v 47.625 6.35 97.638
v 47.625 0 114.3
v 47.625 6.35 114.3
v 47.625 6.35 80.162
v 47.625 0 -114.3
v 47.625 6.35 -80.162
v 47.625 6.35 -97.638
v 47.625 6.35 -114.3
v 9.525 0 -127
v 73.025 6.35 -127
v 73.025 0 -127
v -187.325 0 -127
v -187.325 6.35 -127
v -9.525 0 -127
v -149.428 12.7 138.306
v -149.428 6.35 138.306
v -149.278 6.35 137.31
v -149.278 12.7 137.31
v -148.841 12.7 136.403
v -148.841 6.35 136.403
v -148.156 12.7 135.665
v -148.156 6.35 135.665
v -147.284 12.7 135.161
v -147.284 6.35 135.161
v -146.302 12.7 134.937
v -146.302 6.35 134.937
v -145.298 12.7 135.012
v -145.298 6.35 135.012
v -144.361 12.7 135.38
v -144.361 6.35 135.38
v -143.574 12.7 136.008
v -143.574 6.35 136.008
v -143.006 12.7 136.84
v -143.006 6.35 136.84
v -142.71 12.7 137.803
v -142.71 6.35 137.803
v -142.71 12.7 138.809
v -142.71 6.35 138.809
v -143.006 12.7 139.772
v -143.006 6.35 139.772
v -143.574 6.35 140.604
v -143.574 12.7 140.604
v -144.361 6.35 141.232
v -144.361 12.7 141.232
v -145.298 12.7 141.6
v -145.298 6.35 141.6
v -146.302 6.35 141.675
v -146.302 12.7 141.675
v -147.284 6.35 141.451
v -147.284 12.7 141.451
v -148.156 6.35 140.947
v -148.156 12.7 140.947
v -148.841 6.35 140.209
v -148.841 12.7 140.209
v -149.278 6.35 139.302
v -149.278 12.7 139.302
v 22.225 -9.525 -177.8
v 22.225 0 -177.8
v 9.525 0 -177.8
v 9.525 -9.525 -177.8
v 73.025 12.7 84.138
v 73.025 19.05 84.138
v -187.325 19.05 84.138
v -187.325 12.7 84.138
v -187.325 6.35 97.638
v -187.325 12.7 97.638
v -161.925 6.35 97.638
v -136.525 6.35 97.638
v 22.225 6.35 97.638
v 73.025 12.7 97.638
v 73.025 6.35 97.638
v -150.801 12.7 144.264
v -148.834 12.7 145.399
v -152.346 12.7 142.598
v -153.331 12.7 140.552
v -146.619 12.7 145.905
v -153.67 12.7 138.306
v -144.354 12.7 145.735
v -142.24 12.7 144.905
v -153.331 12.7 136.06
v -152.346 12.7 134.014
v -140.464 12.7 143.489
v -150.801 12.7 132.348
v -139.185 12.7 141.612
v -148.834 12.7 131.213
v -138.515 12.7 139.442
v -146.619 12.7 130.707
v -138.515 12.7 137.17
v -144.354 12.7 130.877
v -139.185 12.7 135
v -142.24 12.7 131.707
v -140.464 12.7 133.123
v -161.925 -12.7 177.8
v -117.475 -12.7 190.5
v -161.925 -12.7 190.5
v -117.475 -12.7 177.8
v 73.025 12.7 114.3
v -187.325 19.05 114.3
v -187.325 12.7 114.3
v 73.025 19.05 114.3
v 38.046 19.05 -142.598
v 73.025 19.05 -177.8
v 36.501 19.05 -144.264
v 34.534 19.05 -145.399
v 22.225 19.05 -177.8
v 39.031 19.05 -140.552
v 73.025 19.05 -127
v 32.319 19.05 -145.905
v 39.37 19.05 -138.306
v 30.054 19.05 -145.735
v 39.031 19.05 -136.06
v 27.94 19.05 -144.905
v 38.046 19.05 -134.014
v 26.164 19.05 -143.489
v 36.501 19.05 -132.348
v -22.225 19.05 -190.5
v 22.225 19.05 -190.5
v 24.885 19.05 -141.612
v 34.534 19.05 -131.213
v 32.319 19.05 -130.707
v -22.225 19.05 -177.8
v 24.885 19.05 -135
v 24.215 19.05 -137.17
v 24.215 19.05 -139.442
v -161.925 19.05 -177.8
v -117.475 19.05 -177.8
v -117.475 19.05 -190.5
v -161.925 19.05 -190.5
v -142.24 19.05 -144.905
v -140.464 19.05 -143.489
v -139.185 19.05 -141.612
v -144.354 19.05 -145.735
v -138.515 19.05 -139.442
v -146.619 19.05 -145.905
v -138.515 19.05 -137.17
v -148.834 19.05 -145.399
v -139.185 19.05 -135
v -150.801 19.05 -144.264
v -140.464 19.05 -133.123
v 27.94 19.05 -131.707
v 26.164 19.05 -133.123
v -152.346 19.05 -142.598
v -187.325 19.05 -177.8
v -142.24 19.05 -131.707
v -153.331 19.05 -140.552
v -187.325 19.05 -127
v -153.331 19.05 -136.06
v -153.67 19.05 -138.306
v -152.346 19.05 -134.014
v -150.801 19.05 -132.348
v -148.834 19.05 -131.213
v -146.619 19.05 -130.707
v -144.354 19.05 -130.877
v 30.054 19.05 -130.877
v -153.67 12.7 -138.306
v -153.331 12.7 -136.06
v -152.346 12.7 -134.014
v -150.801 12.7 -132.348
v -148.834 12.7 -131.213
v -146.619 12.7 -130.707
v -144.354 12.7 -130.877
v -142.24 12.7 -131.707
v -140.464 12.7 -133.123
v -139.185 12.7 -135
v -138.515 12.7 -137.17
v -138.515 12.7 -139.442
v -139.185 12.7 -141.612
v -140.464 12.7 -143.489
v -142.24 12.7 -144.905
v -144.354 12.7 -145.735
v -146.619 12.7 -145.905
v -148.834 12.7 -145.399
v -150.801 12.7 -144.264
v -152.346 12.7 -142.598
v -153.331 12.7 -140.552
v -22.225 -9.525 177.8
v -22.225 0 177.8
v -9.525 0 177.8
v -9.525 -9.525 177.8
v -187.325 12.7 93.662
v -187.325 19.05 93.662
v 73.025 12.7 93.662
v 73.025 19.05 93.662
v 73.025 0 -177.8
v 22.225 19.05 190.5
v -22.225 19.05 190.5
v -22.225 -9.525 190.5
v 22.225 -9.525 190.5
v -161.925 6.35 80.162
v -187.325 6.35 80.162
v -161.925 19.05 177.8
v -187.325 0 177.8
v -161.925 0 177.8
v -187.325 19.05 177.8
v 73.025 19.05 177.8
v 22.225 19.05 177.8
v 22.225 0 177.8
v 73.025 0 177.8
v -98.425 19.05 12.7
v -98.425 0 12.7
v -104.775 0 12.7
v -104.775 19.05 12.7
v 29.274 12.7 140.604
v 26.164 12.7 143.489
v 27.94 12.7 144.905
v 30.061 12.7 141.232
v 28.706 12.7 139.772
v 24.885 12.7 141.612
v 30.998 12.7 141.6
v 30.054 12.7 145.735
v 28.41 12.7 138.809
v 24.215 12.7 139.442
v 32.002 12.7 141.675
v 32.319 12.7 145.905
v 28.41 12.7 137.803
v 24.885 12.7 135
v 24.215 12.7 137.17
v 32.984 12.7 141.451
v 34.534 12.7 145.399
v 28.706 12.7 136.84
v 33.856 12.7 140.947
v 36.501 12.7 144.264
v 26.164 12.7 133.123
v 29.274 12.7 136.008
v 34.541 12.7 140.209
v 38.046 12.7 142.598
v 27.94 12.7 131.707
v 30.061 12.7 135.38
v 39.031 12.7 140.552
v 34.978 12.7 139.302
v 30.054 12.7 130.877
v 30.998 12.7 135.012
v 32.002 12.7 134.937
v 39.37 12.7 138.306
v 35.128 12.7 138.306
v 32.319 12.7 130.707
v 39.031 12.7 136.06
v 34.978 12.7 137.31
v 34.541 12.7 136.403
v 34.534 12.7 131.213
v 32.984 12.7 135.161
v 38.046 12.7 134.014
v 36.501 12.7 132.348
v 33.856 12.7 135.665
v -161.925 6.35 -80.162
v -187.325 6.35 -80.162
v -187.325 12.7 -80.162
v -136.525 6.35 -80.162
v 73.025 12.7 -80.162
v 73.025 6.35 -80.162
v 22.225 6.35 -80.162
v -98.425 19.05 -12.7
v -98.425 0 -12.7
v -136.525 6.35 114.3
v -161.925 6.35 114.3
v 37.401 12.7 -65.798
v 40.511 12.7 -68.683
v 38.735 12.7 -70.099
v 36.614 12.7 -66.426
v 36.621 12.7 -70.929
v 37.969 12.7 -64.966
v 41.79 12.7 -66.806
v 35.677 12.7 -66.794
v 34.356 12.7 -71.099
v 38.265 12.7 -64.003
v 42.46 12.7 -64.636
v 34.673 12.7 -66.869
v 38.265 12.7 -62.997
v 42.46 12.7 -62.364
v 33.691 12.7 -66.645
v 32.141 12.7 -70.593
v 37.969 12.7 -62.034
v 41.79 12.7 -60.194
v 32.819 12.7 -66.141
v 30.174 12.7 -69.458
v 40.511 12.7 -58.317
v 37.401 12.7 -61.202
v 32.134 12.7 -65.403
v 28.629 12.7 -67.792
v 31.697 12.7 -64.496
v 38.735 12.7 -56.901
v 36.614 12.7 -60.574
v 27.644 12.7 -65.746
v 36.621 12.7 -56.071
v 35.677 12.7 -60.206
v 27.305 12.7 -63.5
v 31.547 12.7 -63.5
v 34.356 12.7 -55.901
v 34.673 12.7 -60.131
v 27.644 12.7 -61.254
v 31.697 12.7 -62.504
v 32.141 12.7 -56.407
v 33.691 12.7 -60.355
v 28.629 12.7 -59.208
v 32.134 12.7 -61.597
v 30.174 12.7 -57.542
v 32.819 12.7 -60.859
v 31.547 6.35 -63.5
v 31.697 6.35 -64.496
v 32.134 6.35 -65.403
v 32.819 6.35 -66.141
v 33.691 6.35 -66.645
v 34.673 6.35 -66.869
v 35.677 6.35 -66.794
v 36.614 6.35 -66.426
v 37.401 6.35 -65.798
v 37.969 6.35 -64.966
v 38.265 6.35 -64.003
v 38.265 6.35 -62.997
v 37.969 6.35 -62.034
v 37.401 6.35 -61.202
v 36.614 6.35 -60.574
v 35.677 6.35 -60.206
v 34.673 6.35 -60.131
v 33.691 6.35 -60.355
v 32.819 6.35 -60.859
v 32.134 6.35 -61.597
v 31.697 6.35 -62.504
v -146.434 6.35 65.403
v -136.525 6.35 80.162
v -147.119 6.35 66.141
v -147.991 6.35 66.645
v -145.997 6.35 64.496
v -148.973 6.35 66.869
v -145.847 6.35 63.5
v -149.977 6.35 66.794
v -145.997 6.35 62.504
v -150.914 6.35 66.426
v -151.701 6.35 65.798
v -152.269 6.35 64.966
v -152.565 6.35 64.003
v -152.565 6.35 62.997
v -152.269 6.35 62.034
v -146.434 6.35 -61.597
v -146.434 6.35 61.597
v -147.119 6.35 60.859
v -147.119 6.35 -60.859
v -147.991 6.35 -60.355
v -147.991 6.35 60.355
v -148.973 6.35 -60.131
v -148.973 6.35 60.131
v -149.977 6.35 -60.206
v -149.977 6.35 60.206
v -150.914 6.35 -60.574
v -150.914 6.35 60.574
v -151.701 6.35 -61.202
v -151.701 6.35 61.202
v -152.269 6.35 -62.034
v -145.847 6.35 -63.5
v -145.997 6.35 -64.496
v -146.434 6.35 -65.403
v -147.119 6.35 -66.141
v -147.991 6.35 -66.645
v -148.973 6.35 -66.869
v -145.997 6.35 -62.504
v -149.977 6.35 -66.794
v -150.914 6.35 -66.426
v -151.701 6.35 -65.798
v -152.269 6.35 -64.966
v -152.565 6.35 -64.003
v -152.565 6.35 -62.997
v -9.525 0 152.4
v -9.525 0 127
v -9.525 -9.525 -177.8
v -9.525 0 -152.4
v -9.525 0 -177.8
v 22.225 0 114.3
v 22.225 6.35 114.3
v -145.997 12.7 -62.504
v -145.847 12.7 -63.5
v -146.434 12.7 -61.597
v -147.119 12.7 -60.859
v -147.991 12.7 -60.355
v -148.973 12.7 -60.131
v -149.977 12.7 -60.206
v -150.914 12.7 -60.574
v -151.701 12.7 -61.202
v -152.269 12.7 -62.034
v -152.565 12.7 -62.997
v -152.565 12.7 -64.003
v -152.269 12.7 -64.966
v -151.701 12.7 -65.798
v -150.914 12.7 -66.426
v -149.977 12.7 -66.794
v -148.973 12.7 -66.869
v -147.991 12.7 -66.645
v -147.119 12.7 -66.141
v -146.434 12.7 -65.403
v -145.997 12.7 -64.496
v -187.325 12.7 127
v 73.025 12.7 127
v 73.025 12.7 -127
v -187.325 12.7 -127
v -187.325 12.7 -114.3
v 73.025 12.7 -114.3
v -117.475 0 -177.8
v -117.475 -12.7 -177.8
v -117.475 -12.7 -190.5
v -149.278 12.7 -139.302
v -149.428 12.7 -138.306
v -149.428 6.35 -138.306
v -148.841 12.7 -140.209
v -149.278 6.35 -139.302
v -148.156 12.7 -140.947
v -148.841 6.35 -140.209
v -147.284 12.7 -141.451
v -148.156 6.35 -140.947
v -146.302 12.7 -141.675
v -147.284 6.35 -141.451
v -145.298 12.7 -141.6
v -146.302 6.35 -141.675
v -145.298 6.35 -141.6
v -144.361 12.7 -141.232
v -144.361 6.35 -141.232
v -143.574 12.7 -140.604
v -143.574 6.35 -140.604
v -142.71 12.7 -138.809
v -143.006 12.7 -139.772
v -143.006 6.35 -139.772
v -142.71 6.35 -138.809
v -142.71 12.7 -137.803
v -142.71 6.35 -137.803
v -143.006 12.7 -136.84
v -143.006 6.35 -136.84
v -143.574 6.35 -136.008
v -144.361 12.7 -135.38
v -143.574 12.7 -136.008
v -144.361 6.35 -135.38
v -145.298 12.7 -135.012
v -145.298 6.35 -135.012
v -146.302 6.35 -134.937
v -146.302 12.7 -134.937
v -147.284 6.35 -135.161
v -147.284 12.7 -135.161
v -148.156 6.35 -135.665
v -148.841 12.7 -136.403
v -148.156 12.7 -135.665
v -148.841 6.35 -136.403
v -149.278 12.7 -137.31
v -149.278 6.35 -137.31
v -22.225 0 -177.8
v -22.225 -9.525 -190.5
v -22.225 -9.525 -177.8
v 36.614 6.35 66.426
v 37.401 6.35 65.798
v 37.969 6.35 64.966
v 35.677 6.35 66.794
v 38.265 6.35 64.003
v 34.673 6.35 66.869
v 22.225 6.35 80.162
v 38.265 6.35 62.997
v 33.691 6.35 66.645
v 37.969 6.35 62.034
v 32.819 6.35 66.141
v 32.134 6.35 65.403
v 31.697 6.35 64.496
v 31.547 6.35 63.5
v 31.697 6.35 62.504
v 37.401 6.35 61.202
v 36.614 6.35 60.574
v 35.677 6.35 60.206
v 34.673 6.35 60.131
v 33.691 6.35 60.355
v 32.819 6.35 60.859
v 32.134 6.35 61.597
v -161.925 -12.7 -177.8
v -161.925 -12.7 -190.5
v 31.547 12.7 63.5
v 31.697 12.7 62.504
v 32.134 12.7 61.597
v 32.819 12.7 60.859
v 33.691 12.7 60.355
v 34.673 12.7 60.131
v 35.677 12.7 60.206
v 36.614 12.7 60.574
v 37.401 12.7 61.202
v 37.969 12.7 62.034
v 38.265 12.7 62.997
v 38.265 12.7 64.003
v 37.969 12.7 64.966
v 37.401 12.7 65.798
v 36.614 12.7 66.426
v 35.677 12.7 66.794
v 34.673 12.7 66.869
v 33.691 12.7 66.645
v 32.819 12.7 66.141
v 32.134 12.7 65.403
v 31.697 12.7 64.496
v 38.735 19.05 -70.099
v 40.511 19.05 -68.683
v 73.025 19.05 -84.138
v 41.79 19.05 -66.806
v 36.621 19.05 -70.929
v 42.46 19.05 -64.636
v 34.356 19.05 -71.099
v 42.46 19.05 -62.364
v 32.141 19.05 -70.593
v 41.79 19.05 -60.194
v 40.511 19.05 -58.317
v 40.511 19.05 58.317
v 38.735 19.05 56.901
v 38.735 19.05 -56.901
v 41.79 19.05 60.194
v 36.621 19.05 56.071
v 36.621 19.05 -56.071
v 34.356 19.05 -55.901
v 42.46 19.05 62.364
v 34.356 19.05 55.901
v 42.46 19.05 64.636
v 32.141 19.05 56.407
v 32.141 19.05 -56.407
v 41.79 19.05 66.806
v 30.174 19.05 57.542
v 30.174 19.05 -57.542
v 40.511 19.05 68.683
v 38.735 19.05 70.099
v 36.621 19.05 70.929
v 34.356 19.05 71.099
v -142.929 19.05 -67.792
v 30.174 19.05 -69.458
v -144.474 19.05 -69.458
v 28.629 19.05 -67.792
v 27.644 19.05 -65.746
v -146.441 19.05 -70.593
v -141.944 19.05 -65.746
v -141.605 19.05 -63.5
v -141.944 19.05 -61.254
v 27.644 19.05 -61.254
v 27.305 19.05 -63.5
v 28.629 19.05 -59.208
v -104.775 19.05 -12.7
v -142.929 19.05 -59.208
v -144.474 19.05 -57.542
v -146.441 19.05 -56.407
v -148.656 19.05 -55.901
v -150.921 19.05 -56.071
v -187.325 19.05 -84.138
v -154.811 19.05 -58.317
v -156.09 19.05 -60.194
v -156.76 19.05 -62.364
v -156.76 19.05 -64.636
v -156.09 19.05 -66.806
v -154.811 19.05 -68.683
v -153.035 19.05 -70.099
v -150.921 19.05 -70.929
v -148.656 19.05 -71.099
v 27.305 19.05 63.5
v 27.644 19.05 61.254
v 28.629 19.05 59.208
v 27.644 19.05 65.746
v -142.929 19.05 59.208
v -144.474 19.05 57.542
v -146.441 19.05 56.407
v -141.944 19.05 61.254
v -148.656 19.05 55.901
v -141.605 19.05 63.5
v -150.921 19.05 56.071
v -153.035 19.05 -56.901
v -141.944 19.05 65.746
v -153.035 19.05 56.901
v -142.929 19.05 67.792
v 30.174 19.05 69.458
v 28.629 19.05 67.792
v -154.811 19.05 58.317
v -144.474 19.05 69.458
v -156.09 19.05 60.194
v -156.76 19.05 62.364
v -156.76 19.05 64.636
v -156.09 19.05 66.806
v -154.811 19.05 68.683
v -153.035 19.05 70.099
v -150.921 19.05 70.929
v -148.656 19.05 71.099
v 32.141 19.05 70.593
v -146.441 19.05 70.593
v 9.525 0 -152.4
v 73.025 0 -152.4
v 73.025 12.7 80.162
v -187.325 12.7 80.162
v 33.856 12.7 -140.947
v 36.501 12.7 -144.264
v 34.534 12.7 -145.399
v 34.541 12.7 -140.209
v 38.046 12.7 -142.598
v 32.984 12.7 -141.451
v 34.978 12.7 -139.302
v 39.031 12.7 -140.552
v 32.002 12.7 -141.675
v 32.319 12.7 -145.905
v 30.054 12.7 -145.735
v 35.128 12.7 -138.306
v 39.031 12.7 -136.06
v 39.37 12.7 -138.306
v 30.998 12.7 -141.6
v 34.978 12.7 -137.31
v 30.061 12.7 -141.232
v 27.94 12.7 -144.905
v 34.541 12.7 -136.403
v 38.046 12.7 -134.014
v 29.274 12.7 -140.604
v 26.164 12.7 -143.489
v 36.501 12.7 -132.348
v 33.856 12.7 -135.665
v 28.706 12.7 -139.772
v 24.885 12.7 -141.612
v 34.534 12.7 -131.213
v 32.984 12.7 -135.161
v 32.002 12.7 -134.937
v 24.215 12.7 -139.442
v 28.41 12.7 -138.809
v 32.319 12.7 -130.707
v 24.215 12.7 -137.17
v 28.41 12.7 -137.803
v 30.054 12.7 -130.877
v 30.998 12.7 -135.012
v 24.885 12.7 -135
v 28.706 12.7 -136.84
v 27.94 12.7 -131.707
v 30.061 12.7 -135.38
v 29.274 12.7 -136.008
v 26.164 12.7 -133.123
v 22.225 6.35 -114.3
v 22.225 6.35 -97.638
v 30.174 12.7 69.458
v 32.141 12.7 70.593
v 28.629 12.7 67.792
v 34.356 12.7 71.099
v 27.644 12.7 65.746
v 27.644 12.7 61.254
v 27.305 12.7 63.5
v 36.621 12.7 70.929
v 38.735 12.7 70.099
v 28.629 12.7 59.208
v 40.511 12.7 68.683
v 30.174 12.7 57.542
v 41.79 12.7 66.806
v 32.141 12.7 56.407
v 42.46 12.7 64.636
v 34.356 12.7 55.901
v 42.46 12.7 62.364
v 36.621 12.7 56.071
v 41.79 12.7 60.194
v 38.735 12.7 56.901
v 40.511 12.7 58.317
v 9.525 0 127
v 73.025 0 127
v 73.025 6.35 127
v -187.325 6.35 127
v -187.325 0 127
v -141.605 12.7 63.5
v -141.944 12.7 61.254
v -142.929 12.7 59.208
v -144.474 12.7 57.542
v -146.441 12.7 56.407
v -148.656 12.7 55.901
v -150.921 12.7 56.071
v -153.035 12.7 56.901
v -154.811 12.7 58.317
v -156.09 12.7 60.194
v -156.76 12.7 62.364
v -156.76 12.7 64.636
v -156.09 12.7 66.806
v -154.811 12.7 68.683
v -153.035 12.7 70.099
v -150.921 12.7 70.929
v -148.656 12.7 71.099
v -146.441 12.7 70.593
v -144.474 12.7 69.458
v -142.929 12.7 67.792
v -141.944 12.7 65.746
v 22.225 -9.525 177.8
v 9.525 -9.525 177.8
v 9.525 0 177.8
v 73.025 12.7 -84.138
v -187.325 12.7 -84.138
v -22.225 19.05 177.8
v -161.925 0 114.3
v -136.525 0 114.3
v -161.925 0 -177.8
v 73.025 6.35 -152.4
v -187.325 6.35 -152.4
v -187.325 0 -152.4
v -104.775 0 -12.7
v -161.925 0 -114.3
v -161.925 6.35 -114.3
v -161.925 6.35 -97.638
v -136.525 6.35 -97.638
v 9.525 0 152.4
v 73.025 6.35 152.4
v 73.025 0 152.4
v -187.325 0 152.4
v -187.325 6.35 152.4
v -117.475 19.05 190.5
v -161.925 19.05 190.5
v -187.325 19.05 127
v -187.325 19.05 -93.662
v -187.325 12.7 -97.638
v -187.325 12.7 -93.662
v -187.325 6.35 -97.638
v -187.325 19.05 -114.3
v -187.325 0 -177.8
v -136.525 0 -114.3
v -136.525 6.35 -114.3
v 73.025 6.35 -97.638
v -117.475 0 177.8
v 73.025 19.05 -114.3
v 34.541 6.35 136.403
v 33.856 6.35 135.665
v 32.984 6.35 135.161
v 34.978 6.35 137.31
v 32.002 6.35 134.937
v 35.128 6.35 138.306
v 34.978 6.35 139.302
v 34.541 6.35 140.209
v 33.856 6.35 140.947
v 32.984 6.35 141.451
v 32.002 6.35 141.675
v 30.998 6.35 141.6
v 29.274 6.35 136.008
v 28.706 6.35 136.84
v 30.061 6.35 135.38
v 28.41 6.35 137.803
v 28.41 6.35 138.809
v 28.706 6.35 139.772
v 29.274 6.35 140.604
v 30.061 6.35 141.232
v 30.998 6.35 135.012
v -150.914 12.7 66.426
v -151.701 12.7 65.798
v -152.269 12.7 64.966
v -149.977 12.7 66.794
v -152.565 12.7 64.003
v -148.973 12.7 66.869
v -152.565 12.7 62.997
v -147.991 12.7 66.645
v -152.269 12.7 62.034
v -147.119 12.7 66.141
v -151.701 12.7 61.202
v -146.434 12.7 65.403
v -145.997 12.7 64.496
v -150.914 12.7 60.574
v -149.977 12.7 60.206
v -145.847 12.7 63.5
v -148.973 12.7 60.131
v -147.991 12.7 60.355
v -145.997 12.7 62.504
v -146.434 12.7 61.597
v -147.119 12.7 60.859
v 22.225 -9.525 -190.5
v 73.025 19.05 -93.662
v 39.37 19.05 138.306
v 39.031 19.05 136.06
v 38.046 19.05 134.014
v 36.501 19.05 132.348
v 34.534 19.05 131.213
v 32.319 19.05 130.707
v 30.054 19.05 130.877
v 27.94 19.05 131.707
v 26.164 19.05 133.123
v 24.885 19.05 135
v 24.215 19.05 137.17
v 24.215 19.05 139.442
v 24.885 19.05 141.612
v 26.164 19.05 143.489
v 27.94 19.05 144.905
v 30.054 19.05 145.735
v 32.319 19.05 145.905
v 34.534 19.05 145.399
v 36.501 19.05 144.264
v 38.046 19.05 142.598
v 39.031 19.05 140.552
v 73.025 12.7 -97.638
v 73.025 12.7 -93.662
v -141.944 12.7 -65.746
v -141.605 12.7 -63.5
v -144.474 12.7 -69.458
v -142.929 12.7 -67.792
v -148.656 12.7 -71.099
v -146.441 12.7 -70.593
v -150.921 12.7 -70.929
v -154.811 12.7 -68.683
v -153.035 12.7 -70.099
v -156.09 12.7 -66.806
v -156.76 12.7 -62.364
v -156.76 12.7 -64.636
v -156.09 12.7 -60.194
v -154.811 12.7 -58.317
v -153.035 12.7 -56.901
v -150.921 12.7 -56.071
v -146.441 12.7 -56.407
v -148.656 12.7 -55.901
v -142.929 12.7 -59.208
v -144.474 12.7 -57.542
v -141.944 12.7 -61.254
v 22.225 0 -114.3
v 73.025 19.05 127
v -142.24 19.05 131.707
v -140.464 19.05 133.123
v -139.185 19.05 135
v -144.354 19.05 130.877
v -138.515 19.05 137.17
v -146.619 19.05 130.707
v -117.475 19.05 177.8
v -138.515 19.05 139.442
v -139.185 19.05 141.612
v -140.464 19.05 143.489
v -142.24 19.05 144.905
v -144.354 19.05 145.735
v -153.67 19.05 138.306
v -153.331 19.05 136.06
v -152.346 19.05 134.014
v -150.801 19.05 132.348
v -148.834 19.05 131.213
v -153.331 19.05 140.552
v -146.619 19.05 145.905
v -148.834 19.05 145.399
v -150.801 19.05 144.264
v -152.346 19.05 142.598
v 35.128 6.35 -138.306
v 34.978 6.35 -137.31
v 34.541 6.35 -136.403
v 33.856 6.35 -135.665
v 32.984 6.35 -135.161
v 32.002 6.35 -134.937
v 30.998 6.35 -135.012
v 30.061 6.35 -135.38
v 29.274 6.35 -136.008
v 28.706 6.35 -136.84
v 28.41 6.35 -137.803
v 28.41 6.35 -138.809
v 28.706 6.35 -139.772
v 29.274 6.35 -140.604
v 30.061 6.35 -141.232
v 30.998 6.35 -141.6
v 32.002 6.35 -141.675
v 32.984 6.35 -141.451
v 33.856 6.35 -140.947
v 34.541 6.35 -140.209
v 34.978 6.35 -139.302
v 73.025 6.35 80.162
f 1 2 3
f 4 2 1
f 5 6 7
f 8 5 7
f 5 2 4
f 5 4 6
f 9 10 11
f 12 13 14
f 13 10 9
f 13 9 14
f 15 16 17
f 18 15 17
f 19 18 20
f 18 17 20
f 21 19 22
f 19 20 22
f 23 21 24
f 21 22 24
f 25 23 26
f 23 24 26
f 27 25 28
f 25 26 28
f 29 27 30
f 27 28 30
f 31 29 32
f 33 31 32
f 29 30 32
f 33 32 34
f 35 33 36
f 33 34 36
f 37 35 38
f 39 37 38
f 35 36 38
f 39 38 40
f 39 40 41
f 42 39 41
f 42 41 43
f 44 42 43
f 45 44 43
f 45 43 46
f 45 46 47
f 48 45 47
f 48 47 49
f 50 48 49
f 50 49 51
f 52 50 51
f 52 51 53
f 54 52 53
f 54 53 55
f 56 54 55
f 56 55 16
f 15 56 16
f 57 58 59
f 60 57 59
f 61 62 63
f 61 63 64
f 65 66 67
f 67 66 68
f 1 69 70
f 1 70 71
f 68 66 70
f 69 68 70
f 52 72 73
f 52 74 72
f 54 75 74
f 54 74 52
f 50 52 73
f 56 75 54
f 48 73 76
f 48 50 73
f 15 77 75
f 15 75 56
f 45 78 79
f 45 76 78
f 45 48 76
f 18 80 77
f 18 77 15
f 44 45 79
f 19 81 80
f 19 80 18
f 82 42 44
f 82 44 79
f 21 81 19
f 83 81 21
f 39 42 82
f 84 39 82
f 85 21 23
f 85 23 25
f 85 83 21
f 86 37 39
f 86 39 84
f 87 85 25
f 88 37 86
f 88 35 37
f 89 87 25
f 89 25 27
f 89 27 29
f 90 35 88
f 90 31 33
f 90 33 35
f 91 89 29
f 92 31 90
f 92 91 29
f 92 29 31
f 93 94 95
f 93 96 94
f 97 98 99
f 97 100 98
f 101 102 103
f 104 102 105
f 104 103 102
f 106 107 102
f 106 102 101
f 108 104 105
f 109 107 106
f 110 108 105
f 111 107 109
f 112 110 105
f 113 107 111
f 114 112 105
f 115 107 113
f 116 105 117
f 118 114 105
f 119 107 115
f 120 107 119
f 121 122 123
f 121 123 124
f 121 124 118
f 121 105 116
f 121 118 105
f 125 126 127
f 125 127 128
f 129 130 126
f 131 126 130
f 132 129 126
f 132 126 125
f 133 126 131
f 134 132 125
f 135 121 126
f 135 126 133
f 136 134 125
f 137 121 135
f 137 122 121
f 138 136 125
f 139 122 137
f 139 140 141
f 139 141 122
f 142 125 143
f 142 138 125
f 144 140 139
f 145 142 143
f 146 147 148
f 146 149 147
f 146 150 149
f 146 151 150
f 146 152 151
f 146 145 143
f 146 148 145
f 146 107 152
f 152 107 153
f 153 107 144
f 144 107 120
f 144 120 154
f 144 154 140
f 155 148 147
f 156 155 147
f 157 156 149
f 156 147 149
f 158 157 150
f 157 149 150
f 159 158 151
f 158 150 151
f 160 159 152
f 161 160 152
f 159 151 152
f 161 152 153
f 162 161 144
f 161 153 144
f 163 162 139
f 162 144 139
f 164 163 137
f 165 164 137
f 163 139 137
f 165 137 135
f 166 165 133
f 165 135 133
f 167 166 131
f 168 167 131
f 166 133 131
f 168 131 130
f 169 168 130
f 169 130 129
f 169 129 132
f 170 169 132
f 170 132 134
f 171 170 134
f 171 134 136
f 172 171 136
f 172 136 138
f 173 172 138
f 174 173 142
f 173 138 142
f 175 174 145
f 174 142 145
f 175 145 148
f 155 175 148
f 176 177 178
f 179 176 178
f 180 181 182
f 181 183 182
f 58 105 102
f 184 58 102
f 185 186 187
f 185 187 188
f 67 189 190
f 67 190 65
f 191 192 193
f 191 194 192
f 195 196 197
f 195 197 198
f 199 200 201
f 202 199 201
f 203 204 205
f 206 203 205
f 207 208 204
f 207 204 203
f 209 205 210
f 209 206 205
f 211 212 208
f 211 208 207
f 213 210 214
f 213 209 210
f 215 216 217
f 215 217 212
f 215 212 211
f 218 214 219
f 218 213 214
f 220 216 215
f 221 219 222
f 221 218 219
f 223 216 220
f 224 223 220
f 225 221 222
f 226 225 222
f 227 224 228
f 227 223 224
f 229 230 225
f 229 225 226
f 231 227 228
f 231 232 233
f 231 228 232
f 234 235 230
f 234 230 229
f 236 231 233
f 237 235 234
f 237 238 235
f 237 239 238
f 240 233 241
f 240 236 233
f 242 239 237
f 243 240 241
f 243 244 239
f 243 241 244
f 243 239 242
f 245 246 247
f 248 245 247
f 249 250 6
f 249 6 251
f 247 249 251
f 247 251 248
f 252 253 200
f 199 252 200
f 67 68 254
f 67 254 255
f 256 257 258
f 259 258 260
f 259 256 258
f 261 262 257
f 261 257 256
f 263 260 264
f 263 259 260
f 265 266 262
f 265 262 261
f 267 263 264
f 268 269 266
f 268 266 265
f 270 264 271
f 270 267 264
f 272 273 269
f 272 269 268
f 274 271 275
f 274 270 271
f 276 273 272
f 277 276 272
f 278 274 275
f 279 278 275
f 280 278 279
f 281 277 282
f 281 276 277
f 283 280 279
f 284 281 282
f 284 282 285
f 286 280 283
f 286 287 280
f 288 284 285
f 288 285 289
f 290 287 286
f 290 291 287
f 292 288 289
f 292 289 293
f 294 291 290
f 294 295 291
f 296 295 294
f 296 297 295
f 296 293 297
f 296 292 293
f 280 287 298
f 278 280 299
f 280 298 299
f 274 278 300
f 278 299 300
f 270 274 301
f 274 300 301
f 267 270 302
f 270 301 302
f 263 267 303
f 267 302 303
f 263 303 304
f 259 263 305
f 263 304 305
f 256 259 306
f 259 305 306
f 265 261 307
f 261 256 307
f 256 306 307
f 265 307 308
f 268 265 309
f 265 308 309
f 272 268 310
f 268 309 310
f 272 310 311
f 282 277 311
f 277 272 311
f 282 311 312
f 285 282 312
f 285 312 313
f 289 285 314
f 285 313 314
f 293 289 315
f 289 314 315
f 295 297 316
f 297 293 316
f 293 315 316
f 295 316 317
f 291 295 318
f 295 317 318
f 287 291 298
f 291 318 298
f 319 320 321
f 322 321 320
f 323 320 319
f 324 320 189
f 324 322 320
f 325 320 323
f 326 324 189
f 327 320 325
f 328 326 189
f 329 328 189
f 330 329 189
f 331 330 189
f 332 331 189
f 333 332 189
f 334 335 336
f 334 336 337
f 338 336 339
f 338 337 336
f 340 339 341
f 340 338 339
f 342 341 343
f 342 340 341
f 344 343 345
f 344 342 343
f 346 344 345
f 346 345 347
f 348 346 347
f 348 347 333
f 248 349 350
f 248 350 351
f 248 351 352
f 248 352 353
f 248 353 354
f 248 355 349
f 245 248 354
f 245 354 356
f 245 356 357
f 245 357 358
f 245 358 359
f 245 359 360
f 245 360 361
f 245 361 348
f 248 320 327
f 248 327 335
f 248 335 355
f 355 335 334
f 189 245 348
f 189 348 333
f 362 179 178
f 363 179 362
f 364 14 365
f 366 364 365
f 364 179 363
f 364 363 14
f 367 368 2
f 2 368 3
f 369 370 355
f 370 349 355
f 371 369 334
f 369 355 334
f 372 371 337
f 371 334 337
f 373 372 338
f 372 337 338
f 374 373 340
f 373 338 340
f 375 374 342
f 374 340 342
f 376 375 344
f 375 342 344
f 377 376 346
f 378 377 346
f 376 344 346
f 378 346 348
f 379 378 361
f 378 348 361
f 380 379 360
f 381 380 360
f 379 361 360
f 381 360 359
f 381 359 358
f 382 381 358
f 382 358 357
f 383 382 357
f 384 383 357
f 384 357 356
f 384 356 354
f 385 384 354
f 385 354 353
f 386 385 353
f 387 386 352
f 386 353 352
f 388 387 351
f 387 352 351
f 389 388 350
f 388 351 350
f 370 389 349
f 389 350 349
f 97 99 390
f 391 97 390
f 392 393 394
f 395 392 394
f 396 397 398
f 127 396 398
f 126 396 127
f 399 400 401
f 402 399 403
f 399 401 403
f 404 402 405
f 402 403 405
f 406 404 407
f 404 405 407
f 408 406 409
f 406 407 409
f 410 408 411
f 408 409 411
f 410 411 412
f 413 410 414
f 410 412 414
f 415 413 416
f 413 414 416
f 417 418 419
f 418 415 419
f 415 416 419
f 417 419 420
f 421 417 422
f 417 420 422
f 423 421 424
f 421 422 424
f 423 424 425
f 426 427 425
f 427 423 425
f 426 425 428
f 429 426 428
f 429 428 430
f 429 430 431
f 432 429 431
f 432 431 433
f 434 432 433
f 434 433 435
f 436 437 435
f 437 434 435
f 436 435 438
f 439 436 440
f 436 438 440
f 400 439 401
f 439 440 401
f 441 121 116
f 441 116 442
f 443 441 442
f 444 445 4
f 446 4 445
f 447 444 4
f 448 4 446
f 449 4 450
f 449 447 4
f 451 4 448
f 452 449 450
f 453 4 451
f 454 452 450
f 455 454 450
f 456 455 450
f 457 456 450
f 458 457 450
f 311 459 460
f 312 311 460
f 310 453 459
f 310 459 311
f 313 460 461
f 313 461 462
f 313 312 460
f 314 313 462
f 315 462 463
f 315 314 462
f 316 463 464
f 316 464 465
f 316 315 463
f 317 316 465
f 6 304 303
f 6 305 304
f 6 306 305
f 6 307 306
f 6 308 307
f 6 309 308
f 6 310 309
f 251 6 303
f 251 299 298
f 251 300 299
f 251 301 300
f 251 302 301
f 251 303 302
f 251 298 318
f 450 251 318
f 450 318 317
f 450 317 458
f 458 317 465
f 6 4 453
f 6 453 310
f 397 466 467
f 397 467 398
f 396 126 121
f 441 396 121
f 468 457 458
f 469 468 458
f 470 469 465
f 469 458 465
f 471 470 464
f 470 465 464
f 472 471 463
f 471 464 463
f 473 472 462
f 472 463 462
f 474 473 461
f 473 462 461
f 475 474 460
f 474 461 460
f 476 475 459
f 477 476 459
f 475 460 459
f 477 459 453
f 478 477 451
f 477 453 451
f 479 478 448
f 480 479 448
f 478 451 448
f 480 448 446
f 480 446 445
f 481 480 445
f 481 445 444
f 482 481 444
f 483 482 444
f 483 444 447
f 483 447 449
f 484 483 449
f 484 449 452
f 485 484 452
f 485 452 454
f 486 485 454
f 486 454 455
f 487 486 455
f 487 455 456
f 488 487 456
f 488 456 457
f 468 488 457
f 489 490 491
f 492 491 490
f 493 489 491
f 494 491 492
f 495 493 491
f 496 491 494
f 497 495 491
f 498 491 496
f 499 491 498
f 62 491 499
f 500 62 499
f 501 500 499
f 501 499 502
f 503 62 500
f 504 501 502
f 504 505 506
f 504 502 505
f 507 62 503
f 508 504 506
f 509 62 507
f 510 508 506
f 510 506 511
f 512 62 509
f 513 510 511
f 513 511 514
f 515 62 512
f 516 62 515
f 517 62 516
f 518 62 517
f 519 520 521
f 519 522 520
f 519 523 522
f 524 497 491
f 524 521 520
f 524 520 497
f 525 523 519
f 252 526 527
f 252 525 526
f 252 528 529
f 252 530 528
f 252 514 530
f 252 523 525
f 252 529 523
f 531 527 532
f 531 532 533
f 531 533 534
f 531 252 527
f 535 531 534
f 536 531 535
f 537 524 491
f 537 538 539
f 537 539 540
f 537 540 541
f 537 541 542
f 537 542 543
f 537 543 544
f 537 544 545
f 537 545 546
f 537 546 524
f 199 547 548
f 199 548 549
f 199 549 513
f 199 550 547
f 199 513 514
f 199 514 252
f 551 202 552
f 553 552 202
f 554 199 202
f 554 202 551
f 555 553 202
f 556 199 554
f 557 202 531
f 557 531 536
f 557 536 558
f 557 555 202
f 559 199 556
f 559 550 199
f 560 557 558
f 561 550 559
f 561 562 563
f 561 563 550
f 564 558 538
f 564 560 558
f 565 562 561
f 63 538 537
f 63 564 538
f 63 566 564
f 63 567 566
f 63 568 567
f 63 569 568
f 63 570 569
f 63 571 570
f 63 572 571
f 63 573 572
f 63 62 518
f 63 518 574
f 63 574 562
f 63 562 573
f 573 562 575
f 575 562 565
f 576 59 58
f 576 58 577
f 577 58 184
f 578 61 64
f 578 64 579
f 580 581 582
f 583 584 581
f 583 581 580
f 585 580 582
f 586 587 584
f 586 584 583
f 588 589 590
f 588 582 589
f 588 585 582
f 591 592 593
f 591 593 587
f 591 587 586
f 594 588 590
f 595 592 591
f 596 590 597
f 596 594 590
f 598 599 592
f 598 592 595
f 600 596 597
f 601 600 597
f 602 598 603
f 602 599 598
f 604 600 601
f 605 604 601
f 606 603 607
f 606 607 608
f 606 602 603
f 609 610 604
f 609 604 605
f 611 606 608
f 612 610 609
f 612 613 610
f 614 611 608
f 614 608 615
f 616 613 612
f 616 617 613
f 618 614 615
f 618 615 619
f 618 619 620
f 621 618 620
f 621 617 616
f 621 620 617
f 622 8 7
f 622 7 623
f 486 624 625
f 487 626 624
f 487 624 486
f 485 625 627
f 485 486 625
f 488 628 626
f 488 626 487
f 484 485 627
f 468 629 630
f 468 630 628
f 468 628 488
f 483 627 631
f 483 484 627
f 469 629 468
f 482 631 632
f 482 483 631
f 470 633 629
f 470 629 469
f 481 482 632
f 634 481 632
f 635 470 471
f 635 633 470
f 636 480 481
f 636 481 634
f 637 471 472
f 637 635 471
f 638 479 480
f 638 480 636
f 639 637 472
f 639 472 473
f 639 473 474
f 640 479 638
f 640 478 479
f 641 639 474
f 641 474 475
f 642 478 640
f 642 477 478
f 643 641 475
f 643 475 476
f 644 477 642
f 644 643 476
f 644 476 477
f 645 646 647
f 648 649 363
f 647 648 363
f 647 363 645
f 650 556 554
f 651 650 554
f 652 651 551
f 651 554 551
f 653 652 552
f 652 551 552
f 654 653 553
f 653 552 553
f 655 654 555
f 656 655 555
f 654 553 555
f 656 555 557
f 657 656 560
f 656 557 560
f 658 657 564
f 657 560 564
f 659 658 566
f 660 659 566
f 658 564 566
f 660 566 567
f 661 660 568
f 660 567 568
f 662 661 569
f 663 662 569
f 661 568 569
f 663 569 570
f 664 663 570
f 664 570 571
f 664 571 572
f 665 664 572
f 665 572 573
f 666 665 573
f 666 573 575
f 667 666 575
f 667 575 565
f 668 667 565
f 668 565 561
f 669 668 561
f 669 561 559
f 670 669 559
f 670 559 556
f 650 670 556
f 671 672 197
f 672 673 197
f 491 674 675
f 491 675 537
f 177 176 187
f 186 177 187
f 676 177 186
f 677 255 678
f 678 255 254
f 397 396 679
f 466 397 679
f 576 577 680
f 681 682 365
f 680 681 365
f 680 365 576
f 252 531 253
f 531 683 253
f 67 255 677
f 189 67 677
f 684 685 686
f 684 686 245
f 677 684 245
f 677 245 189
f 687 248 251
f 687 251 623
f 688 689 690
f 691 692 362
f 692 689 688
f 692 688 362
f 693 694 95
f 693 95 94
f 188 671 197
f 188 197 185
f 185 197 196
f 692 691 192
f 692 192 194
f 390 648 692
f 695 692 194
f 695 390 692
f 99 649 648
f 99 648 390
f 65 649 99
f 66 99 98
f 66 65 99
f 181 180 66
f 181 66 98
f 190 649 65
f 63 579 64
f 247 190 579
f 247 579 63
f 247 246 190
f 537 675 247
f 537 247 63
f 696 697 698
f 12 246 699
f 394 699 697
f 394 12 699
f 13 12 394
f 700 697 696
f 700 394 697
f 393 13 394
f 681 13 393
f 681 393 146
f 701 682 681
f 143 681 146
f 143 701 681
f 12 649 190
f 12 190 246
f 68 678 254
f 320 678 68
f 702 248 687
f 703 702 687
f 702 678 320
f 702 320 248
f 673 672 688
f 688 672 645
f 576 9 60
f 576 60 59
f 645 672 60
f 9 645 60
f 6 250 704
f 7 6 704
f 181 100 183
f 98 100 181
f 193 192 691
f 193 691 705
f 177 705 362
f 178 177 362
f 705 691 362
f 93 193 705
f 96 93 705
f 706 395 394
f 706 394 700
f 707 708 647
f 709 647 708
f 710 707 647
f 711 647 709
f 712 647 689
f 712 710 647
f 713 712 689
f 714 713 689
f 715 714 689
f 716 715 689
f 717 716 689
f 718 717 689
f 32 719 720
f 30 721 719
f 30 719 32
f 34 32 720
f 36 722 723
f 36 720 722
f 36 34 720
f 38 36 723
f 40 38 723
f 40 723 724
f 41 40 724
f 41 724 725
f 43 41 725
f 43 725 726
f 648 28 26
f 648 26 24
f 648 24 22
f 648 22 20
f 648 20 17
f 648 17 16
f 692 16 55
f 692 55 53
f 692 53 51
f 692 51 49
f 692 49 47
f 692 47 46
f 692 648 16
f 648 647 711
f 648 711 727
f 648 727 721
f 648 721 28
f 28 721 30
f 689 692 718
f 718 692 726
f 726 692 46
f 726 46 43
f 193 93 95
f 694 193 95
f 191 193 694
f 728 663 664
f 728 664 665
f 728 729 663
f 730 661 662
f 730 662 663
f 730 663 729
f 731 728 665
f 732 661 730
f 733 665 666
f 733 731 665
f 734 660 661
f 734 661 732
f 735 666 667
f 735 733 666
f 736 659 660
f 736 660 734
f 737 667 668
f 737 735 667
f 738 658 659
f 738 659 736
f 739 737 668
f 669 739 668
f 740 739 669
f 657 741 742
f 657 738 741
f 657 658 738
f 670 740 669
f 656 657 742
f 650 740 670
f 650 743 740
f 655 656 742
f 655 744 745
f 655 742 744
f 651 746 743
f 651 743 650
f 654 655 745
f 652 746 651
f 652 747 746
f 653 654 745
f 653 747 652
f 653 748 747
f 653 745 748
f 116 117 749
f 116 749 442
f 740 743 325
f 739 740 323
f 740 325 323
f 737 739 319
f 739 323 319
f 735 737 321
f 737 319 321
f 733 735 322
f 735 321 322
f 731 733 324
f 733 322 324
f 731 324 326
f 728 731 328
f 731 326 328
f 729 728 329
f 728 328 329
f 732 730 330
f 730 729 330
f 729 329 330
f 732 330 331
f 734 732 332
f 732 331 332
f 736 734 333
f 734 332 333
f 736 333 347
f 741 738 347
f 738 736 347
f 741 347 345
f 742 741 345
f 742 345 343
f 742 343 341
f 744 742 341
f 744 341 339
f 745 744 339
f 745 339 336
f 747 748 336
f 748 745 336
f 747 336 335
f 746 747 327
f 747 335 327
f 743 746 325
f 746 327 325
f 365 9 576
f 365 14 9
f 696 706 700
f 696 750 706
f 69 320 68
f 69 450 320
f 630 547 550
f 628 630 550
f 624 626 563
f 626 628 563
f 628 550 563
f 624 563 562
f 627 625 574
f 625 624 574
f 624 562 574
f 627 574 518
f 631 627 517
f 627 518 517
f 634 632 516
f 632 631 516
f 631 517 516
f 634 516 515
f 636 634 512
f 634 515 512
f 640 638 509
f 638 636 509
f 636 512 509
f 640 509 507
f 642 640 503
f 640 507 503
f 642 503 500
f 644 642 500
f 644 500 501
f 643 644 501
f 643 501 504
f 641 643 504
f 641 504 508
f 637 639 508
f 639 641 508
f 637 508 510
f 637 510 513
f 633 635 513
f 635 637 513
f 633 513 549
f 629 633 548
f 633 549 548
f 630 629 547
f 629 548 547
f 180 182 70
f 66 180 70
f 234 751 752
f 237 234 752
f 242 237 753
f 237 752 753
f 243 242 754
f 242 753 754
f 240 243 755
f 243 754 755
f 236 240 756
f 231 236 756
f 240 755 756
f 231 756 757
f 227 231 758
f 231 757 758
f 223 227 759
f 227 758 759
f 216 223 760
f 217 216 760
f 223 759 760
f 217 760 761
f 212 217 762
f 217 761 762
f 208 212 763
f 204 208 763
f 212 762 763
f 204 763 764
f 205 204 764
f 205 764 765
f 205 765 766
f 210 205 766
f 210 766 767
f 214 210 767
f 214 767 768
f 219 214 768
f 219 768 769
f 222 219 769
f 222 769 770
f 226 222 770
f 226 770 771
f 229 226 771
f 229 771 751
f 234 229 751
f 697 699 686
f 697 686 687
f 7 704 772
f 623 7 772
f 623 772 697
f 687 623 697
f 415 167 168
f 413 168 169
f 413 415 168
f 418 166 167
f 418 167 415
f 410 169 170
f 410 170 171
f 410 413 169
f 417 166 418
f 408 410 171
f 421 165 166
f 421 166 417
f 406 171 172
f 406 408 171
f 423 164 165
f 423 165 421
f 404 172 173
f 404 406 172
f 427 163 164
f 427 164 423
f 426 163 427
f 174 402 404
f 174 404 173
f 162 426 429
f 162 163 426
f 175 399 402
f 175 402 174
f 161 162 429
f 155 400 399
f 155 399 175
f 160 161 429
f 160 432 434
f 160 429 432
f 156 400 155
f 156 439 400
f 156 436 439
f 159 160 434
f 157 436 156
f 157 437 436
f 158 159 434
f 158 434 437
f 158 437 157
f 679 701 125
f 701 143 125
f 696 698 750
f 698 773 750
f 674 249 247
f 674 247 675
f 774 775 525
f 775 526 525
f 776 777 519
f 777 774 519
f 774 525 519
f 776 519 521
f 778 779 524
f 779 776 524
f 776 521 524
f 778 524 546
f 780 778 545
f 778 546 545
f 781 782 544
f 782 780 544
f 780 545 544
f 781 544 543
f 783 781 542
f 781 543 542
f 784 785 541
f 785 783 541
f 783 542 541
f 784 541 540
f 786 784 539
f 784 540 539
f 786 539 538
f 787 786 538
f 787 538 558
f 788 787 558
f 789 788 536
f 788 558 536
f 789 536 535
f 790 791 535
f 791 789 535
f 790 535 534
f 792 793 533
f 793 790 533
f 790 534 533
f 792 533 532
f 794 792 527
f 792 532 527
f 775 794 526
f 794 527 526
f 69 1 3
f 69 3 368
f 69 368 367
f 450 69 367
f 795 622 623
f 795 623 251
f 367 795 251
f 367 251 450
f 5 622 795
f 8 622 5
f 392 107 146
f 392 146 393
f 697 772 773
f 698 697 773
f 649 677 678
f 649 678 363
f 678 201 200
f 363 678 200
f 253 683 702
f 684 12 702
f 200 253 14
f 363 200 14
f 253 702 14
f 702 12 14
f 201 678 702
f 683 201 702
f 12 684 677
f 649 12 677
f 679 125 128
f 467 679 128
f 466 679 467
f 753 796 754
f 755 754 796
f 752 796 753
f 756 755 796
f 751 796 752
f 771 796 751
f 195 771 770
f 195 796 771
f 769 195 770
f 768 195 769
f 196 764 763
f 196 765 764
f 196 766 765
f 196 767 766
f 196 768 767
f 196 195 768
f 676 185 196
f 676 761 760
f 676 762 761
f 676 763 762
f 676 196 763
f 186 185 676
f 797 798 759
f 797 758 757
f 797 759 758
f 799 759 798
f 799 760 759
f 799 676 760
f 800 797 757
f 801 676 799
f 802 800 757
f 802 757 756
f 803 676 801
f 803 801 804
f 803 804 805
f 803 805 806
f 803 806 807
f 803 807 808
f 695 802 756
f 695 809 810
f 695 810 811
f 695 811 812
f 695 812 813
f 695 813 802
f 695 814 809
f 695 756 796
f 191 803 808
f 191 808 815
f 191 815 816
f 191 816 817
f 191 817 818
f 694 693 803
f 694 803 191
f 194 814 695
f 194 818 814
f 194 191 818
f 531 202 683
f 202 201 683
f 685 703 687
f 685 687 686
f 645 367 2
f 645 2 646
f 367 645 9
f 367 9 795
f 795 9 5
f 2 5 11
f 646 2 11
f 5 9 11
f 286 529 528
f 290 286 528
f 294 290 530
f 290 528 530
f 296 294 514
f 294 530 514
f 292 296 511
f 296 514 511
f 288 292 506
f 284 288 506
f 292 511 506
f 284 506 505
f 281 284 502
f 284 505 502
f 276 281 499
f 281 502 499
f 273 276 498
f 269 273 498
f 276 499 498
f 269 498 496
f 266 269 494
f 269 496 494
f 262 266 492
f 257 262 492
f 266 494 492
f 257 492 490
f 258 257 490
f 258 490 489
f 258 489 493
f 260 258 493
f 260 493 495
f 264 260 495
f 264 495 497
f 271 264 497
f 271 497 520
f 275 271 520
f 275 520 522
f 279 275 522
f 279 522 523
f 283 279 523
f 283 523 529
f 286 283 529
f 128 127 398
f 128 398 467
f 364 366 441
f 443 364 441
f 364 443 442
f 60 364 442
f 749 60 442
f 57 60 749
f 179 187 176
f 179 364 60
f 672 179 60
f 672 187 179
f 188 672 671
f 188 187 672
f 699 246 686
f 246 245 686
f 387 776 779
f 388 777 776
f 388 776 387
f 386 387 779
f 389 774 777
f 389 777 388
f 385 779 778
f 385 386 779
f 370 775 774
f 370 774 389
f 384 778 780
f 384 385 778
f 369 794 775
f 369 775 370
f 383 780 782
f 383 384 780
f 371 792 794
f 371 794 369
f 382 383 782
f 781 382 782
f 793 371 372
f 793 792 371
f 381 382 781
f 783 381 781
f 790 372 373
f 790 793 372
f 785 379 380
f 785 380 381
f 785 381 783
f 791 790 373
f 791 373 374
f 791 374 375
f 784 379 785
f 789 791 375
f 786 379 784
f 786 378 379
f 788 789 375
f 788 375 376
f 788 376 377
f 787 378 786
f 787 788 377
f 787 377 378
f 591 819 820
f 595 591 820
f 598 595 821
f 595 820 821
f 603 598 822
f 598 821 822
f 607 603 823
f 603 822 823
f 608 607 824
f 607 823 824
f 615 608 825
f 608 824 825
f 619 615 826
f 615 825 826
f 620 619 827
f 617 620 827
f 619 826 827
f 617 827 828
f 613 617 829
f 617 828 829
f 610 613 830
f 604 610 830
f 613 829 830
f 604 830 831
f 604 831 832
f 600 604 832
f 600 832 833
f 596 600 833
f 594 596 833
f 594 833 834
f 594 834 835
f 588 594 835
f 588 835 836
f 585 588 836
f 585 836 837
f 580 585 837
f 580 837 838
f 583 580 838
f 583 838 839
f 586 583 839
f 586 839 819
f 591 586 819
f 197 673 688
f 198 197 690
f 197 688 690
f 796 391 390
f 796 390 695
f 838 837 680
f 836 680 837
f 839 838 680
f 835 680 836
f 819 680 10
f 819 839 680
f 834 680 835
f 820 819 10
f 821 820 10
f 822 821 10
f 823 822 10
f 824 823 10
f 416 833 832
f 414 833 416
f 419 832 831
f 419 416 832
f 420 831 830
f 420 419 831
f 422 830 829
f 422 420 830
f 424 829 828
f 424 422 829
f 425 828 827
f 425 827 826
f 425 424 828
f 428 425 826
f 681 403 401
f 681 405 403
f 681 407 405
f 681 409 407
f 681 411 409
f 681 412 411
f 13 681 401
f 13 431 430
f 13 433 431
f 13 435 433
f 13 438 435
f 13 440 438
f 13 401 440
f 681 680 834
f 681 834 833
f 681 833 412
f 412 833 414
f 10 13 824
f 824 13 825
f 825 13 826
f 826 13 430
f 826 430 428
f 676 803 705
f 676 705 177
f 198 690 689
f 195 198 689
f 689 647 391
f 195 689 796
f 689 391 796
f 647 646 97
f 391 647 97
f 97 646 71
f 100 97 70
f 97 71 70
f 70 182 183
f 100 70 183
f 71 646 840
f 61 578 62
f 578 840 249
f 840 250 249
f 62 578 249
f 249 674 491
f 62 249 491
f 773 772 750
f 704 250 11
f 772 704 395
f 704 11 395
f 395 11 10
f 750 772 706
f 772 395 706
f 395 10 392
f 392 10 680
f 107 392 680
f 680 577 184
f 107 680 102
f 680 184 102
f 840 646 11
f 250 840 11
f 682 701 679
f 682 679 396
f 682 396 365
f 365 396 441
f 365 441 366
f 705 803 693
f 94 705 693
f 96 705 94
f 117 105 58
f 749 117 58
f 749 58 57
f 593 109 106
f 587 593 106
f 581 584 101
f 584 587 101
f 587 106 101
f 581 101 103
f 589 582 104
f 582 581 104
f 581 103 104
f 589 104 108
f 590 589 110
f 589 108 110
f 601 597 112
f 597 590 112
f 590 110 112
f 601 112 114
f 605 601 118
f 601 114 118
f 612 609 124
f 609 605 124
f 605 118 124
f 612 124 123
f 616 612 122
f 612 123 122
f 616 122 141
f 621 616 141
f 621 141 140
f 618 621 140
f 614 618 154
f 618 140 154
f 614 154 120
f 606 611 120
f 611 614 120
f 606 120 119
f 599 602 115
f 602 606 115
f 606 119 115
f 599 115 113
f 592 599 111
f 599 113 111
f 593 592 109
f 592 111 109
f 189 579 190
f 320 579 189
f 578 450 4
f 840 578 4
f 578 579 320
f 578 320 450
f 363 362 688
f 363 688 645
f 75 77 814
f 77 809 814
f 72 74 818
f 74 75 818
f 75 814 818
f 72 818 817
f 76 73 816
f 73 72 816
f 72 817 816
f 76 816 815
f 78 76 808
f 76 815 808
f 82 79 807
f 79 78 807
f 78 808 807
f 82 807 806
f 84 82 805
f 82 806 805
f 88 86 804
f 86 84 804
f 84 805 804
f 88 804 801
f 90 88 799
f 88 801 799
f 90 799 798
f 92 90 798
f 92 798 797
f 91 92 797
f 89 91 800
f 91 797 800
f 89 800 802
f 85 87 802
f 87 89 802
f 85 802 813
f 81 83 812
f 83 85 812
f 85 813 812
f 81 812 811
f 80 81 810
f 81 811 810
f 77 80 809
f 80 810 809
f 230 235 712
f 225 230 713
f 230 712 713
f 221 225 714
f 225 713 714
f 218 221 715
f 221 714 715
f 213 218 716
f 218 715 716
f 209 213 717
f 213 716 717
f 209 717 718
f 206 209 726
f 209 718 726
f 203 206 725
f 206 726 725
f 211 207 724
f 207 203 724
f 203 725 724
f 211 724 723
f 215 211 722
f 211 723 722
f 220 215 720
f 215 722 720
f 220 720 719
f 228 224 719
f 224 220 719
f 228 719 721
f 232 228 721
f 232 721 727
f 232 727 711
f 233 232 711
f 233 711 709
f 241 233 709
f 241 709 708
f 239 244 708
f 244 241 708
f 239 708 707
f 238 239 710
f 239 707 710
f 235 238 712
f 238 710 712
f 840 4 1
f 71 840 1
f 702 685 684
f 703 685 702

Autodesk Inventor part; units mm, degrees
ref_plane "YZ Plane" through (0, 0, 0) normal (1, 0, 0) x (0, 1, 0)
ref_plane "XZ Plane" through (0, 0, 0) normal (0, 1, 0) x (-1, 0, 0)
sketch "Sketch3" plane through (0, 0, 0) normal (0, 0, 1) x (1, 0, 0)
  line L0 (0, -9.525) -> (9.525, -9.525)
  line L1 (9.525, -9.525) -> (9.525, 0)
  line L2 (0, 0) -> (0, -9.525) construction
  line L3 (0, 0) -> (9.525, 0) construction
  line L4 (0, -9.525) -> (-9.525, -9.525)
  line L5 (-9.525, -9.525) -> (-9.525, 0)
  line L6 (9.525, 0) -> (73.025, 0)
  line L7 (-187.325, 0) -> (-187.325, 19.05)
  line L8 (-187.325, 0) -> (-9.525, 0)
  line L9 (73.025, 0) -> (73.025, 19.05)
  line L10 (73.025, 19.05) -> (-187.325, 19.05)
  dimension "d0" = 9.525
  dimension "d1" = 9.525
  dimension "d6" = 63.5
  dimension "d8" = 19.05
  dimension "d9" = 177.8
extrude "Extrusion1" add sketch "Sketch3" along normal mid plane 355.6
sketch "Sketch4" plane through (0, 0, 177.8) normal (0, 0, 1) x (1, 0, 0)
  line L0 (-187.325, 19.05) -> (73.025, 19.05) construction
  line L1 (0, 19.05) -> (0, -9.525) construction
  line L2 (9.525, -9.525) -> (-9.525, -9.525) construction
  line L3 (0, -9.525) -> (-22.225, -9.525)
  line L4 (-22.225, -9.525) -> (-22.225, 19.05)
  line L5 (-22.225, 19.05) -> (0, 19.05)
  line L6 (187.325, 19.05) -> (-73.025, 19.05) construction
  line L7 (0, -9.525) -> (22.225, -9.525)
  line L8 (22.225, -9.525) -> (22.225, 19.05)
  line L9 (0, 19.05) -> (22.225, 19.05)
  point P0 (0, 0)
  dimension "d12" = 22.225
extrude "Extrusion2" add sketch "Sketch4" along normal blind 12.7
mirror "Mirror1" about plane through (0, 0, 0) normal (0, 0, 1) of "Extrusion2"
sketch "Sketch6" plane through (-187.325, 0, -177.8) normal (0, -1, 0) x (1, 0, 0)
  line L0 (82.55, 165.1) -> (88.9, 165.1)
  line L1 (88.9, 165.1) -> (88.9, 190.5)
  line L2 (88.9, 190.5) -> (82.55, 190.5)
  line L3 (82.55, 190.5) -> (82.55, 165.1)
  line L4 (82.55, 165.1) -> (88.9, 190.5) construction
  line L5 (88.9, 165.1) -> (82.55, 190.5) construction
  line L6 (177.8, 0) -> (177.8, 355.6) projected
  point P0 (187.325, 177.8)
  point P1 (85.725, 177.8)
  dimension "d16" = 12.7
  dimension "d18" = 6.35
  dimension "d19" = 88.9
extrude "Extrusion3" cut sketch "Sketch6" against normal through all
sketch "Sketch7" plane through (0, 0, 177.8) normal (0, 0, 1) x (1, 0, 0)
  line L0 (-187.325, 19.05) -> (-22.225, 19.05) projected
  line L1 (-161.925, 19.05) -> (-117.475, 19.05)
  line L2 (-117.475, 19.05) -> (-117.475, -12.7)
  line L3 (-117.475, -12.7) -> (-161.925, -12.7)
  line L4 (-161.925, -12.7) -> (-161.925, 19.05)
  line L5 (-187.325, 19.05) -> (-187.325, 0) projected
  point P0 (0, 0)
  dimension "d22" = 44.45
  dimension "d23" = 31.75
  dimension "d24" = 25.4
extrude "Extrusion4" add sketch "Sketch7" along normal blind 12.7
mirror "Mirror2" about plane through (0, 0, 0) normal (0, 0, 1) of "Extrusion4"
sketch "Sketch9" plane through (73.025, 0, 177.8) normal (1, 0, 0) x (0, 0, -1)
  line L0 (355.6, 19.05) -> (0, 19.05) projected
  line L1 (50.8, 19.05) -> (63.5, 19.05)
  line L2 (63.5, 19.05) -> (63.5, 12.7)
  line L3 (63.5, 12.7) -> (50.8, 12.7)
  line L4 (50.8, 12.7) -> (50.8, 19.05)
  line L5 (0, 0) -> (0, 19.05) projected
  point P0 (177.8, 0)
  dimension "d28" = 12.7
  dimension "d29" = 6.35
  dimension "d30" = 50.8
extrude "Extrusion5" cut sketch "Sketch9" against normal through all
mirror "Mirror3" about plane through (0, 0, 0) normal (0, 0, 1) of "Extrusion5"
sketch "Sketch12" plane through (73.025, 0, 177.8) normal (1, 0, 0) x (0, 0, -1)
  line L0 (355.6, 0) -> (0, 0) construction
  line L1 (88.9, 0) -> (88.9, 16.5009) construction
  line L2 (0, 0) -> (0, 19.05) projected
  line L3 (50.8, 19.05) -> (0, 19.05) projected
  line L4 (84.1375, 19.05) -> (84.1375, 12.7)
  line L5 (84.1375, 12.7) -> (80.1624, 12.7)
  line L6 (80.1624, 12.7) -> (80.1624, 6.35)
  line L7 (80.1624, 6.35) -> (88.9, 6.35)
  line L8 (93.6625, 19.05) -> (93.6625, 12.7)
  line L9 (93.6625, 12.7) -> (97.6376, 12.7)
  line L10 (97.6376, 12.7) -> (97.6376, 6.35)
  line L11 (97.6376, 6.35) -> (88.9, 6.35)
  line L12 (84.1375, 19.05) -> (93.6625, 19.05)
  point P0 (177.8, 0)
  dimension "d46" = 88.9
  dimension "d47" = 4.7625
  dimension "d48" = 6.35
  dimension "d49" = 6.35
  dimension "d50" = 8.7376
extrude "Extrusion8" cut sketch "Sketch12" against normal through all
mirror "Mirror4" about plane through (0, 0, 0) normal (0, 0, 1) of "Extrusion8"
ref_plane "Work Plane1" through (-57.15, 0, 177.8) normal (1, 0, 0) x (0, 0, -1)
sketch "Sketch13" plane through (-57.15, 0, 177.8) normal (1, 0, 0) x (0, 0, -1)
  line L0 (25.4, 0) -> (50.8, 0)
  line L1 (50.8, 0) -> (50.8, 6.35)
  line L2 (50.8, 6.35) -> (25.4, 6.35)
  line L3 (25.4, 6.35) -> (25.4, 0)
  line L4 (0, 0) -> (0, 19.05) projected
  point P0 (177.8, 0)
  dimension "d54" = 25.4
  dimension "d55" = 6.35
  dimension "d56" = 25.4
extrude "Extrusion9" cut sketch "Sketch13" along normal mid plane 260.35
mirror "Mirror5" about plane through (0, 0, 0) normal (0, 0, 1) of "Extrusion9"
sketch "Sketch14" plane through (0, 0, 0) normal (0, 0, 1) x (1, 0, 0)
  line L0 (-187.325, 0) -> (-161.925, 0) projected
  line L1 (-161.925, 0) -> (-136.525, 0)
  line L2 (-136.525, 0) -> (-136.525, 6.35)
  line L3 (-136.525, 6.35) -> (-161.925, 6.35)
  line L4 (-161.925, 6.35) -> (-161.925, 0)
  line L5 (-187.325, 19.05) -> (-187.325, 0) projected
  point P0 (0, 0)
  dimension "d59" = 25.4
  dimension "d60" = 6.35
  dimension "d61" = 25.4
extrude "Extrusion10" cut sketch "Sketch14" along normal mid plane 228.6
mirror "Mirror6" about plane through (-57.15, 0, 177.8) normal (1, 0, 0) of "Extrusion10"
sketch "Sketch16" plane through (-161.925, 6.35, -80.1624) normal (0, -1, 0) x (1, 0, 0)
  circle A0 centre (12.7, 143.6624) radius 3.3782
  line L0 (0, 194.4624) -> (25.4, 194.4624) projected
  line L1 (0, -34.1376) -> (0, 194.4624) projected
  point P0 (161.925, 80.1624)
  dimension "d71" = 6.7564
  dimension "d72" = 50.8
  dimension "d73" = 12.7
extrude "Extrusion11" cut sketch "Sketch16" against normal through all
sketch "Sketch17" plane through (-187.325, 19.05, 84.1375) normal (0, 1, 0) x (1, 0, 0)
  circle A0 centre (38.1, 20.6375) radius 3.3782 projected
  circle A1 centre (38.1, 20.6375) radius 7.62
  point P0 (187.325, 84.1375)
  dimension "d76" = 15.24
extrude "Extrusion12" cut sketch "Sketch17" against normal blind 6.35
mirror "Mirror7" about plane through (0, 0, 0) normal (0, 0, 1) of "Extrusion12", "Extrusion11"
mirror "Mirror8" about plane through (-57.15, 0, 177.8) normal (1, 0, 0) of "Extrusion12", "Extrusion11", "Mirror7"
sketch "Sketch18" plane through (-171.45, 6.35, 152.4) normal (0, -1, 0) x (1, 0, 0)
  circle A0 centre (203.2, -14.094) radius 3.3782
  line L0 (228.6, 0) -> (228.6, -25.4) projected
  point P0 (171.45, -152.4)
  dimension "d79" = 6.7564
  dimension "d80" = 25.4
extrude "Extrusion13" cut sketch "Sketch18" against normal through all
sketch "Sketch19" plane through (22.225, 19.05, 177.8) normal (0, 1, 0) x (1, 0, 0)
  circle A0 centre (9.525, 39.494) radius 3.3782 projected
  circle A1 centre (9.525, 39.494) radius 7.62
  point P0 (-22.225, 177.8)
  dimension "d83" = 15.24
extrude "Extrusion14" cut sketch "Sketch19" against normal blind 6.35
mirror "Mirror9" about plane through (-57.15, 0, 177.8) normal (1, 0, 0) of "Extrusion13", "Extrusion14"
mirror "Mirror10" about plane through (0, 0, 0) normal (0, 0, 1) of "Extrusion14", "Extrusion13", "Mirror9"
equation "\"d10\" = length"
equation "\"width\" = 260.35"
equation "\"length\" = 355.6"
equation "\"d53\" = -0.5 * width"
properties part number "BandSawJigBottom" material "LCP Plastic"
